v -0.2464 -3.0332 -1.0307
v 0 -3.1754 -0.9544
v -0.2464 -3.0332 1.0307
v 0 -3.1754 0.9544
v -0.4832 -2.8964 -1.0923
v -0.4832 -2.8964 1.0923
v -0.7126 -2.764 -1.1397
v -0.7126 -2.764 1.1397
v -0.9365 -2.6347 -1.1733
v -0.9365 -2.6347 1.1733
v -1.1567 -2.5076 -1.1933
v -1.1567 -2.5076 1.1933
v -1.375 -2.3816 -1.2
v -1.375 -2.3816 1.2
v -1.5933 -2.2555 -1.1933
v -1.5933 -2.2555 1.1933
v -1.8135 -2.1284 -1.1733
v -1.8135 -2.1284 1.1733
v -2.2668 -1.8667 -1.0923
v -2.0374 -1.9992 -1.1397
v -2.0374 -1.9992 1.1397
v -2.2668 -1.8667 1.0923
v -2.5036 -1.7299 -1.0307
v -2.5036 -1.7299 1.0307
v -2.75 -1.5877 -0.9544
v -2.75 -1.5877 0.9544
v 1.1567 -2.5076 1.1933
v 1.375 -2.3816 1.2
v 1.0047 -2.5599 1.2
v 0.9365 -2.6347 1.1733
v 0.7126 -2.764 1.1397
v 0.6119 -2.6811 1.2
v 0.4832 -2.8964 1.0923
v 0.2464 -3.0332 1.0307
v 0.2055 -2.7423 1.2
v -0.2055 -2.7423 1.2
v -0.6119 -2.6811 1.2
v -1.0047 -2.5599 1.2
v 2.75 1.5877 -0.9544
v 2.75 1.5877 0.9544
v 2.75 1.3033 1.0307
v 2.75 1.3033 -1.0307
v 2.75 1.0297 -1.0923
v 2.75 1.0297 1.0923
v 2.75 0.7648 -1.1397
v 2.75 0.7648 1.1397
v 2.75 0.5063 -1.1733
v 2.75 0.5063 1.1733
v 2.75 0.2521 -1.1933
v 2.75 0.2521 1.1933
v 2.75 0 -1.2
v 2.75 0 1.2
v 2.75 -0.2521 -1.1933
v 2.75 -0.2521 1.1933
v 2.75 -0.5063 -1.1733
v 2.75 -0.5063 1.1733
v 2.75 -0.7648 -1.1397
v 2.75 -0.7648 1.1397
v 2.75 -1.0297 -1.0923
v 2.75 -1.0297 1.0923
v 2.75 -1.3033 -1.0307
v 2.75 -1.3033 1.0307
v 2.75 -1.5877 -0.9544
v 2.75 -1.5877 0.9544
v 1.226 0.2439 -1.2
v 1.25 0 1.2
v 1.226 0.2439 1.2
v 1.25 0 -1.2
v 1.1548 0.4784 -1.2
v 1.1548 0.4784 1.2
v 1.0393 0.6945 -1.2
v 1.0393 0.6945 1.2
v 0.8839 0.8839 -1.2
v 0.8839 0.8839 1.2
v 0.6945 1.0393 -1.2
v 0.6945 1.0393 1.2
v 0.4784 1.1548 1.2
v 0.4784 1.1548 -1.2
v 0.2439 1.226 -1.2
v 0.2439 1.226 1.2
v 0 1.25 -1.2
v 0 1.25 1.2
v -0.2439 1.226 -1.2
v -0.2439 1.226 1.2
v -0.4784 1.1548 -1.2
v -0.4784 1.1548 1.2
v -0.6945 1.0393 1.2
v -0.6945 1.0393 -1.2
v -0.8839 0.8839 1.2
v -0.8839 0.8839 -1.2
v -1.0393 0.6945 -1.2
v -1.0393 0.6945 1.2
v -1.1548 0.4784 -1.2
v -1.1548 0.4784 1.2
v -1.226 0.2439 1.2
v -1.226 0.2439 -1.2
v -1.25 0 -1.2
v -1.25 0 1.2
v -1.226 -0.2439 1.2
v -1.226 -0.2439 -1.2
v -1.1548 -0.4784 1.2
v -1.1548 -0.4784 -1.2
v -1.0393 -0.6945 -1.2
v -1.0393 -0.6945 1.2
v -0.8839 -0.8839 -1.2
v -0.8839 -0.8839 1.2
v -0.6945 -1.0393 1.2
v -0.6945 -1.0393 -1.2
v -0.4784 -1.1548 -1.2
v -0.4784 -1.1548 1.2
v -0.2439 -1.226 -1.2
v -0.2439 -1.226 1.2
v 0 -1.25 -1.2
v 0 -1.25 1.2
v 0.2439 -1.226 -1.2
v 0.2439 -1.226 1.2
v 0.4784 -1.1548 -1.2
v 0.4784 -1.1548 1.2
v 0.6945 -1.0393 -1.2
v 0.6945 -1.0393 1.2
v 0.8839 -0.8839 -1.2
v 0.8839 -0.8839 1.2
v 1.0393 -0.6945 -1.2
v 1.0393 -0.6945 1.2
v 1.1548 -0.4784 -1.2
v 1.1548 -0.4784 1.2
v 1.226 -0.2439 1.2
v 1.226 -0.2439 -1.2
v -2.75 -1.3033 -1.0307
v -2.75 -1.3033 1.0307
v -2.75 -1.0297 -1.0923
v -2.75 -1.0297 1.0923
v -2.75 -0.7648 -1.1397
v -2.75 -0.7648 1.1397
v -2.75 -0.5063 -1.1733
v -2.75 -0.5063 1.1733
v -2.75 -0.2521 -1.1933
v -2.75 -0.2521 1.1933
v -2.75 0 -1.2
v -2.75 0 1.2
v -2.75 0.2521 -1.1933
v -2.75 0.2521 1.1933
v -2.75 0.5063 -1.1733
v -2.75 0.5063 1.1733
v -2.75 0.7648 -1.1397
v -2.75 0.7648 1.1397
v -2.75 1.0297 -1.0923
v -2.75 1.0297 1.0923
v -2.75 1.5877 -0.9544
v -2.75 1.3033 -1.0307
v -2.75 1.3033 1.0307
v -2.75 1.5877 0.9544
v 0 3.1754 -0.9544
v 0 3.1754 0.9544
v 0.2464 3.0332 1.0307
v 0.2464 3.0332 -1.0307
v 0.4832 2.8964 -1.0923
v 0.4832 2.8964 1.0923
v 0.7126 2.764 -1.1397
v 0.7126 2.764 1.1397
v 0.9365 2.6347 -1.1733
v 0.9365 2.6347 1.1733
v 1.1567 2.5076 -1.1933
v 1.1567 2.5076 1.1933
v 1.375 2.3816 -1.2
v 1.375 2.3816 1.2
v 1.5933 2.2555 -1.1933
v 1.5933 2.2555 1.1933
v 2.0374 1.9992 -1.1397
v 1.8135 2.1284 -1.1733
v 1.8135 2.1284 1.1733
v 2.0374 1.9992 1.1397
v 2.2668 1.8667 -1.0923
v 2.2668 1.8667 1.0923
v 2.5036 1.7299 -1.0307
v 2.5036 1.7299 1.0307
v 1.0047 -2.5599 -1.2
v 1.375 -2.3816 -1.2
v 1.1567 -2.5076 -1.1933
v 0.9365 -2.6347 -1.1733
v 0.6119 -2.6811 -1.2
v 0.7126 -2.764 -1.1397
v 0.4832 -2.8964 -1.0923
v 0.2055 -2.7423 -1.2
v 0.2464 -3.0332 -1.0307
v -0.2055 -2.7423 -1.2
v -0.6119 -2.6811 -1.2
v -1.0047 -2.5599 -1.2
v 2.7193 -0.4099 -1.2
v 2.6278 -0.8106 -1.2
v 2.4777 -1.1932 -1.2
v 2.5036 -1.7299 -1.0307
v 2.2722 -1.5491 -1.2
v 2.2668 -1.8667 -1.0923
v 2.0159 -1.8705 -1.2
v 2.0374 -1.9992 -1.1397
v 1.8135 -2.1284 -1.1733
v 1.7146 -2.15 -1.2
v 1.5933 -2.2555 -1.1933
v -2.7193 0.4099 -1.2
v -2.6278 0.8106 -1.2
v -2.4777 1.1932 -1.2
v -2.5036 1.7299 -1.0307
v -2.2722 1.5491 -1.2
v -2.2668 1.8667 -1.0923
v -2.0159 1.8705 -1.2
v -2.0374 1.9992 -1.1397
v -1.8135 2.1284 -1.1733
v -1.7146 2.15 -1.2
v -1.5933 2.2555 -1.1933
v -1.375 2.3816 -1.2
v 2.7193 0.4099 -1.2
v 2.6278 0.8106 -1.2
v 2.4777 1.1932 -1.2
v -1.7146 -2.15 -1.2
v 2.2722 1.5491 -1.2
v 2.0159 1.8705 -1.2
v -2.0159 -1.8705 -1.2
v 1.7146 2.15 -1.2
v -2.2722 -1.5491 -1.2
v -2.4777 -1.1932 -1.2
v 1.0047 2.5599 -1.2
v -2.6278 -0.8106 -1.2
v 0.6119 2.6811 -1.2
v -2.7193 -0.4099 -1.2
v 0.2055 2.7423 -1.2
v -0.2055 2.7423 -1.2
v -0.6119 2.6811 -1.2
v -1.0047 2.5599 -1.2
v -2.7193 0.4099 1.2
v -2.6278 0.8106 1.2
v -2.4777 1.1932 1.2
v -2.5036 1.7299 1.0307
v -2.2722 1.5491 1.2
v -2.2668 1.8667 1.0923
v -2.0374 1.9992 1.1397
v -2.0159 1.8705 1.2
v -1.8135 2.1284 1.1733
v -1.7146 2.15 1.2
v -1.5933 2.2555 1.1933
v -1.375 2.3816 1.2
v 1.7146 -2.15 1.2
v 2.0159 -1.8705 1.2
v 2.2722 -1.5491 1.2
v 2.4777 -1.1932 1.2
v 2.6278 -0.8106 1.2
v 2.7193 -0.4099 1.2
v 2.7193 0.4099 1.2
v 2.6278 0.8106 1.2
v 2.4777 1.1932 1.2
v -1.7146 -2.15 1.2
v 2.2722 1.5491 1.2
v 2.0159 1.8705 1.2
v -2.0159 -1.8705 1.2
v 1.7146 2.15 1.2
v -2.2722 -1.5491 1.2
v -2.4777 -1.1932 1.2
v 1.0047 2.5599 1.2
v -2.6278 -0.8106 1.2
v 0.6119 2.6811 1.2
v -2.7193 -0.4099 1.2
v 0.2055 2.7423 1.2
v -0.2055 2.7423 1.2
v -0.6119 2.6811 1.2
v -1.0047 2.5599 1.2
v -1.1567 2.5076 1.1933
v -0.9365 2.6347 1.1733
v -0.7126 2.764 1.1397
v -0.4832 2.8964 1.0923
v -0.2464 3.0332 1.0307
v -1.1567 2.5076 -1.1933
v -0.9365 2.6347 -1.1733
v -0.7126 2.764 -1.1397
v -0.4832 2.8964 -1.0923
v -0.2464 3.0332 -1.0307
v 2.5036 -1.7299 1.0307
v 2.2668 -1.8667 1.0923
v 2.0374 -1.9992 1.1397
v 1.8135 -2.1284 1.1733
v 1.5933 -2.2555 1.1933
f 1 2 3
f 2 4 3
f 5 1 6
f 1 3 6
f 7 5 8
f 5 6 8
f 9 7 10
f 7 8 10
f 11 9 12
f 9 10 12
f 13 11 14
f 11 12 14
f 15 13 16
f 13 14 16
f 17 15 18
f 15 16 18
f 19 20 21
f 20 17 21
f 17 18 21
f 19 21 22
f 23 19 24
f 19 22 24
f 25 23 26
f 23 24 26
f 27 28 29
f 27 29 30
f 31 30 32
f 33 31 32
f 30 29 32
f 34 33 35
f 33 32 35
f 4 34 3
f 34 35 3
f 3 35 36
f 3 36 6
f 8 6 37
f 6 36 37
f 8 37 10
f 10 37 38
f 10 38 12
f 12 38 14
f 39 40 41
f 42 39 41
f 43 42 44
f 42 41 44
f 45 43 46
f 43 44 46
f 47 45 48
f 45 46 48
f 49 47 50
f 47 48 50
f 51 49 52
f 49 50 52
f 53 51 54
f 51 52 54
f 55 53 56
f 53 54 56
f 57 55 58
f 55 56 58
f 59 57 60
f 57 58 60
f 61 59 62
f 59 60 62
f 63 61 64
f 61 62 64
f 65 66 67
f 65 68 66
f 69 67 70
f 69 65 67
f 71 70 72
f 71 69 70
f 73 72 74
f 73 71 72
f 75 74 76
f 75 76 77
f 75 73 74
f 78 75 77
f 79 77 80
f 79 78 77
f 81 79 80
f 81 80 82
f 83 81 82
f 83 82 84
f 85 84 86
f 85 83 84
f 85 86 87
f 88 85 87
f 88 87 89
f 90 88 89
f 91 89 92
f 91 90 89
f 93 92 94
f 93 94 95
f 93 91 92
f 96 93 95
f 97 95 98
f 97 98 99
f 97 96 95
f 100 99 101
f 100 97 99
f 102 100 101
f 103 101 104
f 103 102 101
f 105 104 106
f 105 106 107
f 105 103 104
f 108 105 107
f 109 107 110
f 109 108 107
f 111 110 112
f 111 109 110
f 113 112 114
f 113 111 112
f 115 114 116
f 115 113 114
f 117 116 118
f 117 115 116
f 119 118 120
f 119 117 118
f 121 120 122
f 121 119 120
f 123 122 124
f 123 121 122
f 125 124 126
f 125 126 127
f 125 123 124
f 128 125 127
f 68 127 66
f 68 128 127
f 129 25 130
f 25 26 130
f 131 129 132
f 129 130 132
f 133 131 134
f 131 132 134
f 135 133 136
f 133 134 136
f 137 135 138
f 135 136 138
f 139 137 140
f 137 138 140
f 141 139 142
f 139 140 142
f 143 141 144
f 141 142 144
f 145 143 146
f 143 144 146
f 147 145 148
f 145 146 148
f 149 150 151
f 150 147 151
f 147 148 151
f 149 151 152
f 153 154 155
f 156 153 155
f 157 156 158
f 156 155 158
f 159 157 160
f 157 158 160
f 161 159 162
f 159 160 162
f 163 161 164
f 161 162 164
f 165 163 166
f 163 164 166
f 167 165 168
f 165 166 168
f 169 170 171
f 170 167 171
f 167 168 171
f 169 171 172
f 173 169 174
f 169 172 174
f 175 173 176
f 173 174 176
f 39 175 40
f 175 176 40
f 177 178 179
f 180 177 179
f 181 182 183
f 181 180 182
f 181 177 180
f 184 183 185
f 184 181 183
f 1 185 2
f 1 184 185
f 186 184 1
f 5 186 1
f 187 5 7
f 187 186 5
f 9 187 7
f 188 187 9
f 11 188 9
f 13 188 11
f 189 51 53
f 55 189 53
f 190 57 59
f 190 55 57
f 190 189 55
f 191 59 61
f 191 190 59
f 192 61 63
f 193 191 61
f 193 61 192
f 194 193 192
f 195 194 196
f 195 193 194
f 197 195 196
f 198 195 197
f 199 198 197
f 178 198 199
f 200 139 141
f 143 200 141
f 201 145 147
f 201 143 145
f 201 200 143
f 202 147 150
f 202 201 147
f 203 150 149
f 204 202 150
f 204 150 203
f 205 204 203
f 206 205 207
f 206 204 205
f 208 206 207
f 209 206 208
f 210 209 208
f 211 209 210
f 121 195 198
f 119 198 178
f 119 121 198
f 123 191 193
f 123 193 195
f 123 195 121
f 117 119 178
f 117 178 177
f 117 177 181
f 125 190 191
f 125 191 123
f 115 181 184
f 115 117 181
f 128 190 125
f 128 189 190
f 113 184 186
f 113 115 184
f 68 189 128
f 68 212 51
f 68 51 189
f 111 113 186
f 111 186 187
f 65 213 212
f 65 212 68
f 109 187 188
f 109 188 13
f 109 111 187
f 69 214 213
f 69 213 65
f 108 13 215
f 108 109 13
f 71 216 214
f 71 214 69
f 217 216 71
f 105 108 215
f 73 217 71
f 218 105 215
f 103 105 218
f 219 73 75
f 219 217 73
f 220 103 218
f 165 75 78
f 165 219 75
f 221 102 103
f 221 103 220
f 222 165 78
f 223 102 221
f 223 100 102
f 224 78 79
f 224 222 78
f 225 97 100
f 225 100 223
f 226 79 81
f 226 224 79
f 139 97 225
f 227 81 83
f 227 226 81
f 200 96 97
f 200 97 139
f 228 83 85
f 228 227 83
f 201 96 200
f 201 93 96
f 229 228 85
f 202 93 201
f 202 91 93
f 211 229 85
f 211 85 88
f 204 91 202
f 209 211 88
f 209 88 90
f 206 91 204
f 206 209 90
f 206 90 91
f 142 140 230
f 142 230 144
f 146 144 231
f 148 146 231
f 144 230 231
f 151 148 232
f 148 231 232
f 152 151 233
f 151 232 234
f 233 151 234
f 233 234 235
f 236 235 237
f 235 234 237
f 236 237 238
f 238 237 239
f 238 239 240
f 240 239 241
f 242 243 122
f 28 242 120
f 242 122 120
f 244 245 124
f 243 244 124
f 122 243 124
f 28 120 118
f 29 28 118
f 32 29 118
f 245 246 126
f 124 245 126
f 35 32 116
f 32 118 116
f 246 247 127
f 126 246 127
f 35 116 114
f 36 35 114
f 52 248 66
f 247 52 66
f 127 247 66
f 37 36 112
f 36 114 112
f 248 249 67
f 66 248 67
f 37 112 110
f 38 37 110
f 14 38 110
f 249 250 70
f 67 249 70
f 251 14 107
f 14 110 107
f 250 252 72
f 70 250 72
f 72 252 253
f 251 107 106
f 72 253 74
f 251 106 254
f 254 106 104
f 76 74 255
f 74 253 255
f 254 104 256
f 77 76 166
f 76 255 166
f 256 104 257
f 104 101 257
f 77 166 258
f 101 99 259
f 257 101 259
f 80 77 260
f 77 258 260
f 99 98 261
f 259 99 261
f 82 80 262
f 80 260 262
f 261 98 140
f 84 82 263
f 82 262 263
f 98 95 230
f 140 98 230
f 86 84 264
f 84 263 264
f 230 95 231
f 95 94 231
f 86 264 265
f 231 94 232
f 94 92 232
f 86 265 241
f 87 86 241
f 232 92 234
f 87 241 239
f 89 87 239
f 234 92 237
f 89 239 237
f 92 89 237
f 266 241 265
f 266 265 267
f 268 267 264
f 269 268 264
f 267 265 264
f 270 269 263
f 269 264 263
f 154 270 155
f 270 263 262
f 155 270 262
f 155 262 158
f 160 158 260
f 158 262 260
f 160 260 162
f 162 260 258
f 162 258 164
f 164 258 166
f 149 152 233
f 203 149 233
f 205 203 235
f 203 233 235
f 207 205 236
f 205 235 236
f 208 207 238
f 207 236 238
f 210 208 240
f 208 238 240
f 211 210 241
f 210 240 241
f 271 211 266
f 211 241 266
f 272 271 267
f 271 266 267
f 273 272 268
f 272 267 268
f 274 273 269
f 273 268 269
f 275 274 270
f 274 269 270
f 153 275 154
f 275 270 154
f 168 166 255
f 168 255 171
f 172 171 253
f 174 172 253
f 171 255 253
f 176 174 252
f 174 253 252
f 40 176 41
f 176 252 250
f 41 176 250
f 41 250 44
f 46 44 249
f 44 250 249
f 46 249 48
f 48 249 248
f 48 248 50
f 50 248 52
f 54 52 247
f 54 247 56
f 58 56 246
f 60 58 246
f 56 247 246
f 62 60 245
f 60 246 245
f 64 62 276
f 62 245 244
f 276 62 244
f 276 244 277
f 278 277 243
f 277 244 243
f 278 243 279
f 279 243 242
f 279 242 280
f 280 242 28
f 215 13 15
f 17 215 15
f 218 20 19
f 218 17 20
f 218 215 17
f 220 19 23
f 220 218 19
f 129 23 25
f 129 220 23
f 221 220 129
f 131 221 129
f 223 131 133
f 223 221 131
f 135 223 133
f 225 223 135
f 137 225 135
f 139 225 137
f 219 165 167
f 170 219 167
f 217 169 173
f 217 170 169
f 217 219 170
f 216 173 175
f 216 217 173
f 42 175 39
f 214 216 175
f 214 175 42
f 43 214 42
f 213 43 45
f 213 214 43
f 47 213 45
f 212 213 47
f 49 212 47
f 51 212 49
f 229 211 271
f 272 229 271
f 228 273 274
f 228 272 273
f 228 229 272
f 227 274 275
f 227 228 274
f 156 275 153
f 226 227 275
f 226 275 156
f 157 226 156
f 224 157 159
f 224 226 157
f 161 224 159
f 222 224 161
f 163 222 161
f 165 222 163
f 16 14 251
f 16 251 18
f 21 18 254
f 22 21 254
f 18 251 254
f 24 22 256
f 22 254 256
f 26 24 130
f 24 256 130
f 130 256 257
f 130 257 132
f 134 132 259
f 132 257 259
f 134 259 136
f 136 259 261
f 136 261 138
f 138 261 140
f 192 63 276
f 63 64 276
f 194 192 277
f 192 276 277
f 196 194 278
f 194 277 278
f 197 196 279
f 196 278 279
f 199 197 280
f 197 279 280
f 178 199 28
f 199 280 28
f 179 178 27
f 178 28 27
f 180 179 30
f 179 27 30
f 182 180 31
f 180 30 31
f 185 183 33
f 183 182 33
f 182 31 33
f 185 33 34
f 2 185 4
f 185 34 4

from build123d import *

# Parameters (mm, degrees)
SKETCH2_R           = 1.25
BOSS_EXTRUDE1_DEPTH = 1.2


with BuildPart() as part:
    # Sketch2 → Boss-Extrude1 (new body, symmetric)
    with BuildSketch(Plane.XY):
        Polygon((2.75, 1.58771324), (2.75, -1.58771324), (0, -3.175426481), (-2.75, -1.58771324), (-2.75, 1.58771324), (0, 3.175426481), align=None)
        Circle(SKETCH2_R, mode=Mode.SUBTRACT)
    extrude(amount=BOSS_EXTRUDE1_DEPTH, both=True)

    # Sketch4 → Cut-Revolve2 (revolve, cut)
    with BuildSketch(Plane(origin=(0, 0, 0), x_dir=(0, 0, -1), z_dir=(1, 0, 0))):
        Polygon((1.2, 2.75), (1.2, 4.328660734), (0.2885598, 4.328660734), align=None)
    cut_revolve2 = revolve(axis=Axis((0, 0, 2.99453507), (0, 0, -1)), mode=Mode.SUBTRACT)

    # Mirror1: Cut-Revolve2 across plane
    add(cut_revolve2.mirror(Plane.XY), mode=Mode.SUBTRACT)


solid = part.part
